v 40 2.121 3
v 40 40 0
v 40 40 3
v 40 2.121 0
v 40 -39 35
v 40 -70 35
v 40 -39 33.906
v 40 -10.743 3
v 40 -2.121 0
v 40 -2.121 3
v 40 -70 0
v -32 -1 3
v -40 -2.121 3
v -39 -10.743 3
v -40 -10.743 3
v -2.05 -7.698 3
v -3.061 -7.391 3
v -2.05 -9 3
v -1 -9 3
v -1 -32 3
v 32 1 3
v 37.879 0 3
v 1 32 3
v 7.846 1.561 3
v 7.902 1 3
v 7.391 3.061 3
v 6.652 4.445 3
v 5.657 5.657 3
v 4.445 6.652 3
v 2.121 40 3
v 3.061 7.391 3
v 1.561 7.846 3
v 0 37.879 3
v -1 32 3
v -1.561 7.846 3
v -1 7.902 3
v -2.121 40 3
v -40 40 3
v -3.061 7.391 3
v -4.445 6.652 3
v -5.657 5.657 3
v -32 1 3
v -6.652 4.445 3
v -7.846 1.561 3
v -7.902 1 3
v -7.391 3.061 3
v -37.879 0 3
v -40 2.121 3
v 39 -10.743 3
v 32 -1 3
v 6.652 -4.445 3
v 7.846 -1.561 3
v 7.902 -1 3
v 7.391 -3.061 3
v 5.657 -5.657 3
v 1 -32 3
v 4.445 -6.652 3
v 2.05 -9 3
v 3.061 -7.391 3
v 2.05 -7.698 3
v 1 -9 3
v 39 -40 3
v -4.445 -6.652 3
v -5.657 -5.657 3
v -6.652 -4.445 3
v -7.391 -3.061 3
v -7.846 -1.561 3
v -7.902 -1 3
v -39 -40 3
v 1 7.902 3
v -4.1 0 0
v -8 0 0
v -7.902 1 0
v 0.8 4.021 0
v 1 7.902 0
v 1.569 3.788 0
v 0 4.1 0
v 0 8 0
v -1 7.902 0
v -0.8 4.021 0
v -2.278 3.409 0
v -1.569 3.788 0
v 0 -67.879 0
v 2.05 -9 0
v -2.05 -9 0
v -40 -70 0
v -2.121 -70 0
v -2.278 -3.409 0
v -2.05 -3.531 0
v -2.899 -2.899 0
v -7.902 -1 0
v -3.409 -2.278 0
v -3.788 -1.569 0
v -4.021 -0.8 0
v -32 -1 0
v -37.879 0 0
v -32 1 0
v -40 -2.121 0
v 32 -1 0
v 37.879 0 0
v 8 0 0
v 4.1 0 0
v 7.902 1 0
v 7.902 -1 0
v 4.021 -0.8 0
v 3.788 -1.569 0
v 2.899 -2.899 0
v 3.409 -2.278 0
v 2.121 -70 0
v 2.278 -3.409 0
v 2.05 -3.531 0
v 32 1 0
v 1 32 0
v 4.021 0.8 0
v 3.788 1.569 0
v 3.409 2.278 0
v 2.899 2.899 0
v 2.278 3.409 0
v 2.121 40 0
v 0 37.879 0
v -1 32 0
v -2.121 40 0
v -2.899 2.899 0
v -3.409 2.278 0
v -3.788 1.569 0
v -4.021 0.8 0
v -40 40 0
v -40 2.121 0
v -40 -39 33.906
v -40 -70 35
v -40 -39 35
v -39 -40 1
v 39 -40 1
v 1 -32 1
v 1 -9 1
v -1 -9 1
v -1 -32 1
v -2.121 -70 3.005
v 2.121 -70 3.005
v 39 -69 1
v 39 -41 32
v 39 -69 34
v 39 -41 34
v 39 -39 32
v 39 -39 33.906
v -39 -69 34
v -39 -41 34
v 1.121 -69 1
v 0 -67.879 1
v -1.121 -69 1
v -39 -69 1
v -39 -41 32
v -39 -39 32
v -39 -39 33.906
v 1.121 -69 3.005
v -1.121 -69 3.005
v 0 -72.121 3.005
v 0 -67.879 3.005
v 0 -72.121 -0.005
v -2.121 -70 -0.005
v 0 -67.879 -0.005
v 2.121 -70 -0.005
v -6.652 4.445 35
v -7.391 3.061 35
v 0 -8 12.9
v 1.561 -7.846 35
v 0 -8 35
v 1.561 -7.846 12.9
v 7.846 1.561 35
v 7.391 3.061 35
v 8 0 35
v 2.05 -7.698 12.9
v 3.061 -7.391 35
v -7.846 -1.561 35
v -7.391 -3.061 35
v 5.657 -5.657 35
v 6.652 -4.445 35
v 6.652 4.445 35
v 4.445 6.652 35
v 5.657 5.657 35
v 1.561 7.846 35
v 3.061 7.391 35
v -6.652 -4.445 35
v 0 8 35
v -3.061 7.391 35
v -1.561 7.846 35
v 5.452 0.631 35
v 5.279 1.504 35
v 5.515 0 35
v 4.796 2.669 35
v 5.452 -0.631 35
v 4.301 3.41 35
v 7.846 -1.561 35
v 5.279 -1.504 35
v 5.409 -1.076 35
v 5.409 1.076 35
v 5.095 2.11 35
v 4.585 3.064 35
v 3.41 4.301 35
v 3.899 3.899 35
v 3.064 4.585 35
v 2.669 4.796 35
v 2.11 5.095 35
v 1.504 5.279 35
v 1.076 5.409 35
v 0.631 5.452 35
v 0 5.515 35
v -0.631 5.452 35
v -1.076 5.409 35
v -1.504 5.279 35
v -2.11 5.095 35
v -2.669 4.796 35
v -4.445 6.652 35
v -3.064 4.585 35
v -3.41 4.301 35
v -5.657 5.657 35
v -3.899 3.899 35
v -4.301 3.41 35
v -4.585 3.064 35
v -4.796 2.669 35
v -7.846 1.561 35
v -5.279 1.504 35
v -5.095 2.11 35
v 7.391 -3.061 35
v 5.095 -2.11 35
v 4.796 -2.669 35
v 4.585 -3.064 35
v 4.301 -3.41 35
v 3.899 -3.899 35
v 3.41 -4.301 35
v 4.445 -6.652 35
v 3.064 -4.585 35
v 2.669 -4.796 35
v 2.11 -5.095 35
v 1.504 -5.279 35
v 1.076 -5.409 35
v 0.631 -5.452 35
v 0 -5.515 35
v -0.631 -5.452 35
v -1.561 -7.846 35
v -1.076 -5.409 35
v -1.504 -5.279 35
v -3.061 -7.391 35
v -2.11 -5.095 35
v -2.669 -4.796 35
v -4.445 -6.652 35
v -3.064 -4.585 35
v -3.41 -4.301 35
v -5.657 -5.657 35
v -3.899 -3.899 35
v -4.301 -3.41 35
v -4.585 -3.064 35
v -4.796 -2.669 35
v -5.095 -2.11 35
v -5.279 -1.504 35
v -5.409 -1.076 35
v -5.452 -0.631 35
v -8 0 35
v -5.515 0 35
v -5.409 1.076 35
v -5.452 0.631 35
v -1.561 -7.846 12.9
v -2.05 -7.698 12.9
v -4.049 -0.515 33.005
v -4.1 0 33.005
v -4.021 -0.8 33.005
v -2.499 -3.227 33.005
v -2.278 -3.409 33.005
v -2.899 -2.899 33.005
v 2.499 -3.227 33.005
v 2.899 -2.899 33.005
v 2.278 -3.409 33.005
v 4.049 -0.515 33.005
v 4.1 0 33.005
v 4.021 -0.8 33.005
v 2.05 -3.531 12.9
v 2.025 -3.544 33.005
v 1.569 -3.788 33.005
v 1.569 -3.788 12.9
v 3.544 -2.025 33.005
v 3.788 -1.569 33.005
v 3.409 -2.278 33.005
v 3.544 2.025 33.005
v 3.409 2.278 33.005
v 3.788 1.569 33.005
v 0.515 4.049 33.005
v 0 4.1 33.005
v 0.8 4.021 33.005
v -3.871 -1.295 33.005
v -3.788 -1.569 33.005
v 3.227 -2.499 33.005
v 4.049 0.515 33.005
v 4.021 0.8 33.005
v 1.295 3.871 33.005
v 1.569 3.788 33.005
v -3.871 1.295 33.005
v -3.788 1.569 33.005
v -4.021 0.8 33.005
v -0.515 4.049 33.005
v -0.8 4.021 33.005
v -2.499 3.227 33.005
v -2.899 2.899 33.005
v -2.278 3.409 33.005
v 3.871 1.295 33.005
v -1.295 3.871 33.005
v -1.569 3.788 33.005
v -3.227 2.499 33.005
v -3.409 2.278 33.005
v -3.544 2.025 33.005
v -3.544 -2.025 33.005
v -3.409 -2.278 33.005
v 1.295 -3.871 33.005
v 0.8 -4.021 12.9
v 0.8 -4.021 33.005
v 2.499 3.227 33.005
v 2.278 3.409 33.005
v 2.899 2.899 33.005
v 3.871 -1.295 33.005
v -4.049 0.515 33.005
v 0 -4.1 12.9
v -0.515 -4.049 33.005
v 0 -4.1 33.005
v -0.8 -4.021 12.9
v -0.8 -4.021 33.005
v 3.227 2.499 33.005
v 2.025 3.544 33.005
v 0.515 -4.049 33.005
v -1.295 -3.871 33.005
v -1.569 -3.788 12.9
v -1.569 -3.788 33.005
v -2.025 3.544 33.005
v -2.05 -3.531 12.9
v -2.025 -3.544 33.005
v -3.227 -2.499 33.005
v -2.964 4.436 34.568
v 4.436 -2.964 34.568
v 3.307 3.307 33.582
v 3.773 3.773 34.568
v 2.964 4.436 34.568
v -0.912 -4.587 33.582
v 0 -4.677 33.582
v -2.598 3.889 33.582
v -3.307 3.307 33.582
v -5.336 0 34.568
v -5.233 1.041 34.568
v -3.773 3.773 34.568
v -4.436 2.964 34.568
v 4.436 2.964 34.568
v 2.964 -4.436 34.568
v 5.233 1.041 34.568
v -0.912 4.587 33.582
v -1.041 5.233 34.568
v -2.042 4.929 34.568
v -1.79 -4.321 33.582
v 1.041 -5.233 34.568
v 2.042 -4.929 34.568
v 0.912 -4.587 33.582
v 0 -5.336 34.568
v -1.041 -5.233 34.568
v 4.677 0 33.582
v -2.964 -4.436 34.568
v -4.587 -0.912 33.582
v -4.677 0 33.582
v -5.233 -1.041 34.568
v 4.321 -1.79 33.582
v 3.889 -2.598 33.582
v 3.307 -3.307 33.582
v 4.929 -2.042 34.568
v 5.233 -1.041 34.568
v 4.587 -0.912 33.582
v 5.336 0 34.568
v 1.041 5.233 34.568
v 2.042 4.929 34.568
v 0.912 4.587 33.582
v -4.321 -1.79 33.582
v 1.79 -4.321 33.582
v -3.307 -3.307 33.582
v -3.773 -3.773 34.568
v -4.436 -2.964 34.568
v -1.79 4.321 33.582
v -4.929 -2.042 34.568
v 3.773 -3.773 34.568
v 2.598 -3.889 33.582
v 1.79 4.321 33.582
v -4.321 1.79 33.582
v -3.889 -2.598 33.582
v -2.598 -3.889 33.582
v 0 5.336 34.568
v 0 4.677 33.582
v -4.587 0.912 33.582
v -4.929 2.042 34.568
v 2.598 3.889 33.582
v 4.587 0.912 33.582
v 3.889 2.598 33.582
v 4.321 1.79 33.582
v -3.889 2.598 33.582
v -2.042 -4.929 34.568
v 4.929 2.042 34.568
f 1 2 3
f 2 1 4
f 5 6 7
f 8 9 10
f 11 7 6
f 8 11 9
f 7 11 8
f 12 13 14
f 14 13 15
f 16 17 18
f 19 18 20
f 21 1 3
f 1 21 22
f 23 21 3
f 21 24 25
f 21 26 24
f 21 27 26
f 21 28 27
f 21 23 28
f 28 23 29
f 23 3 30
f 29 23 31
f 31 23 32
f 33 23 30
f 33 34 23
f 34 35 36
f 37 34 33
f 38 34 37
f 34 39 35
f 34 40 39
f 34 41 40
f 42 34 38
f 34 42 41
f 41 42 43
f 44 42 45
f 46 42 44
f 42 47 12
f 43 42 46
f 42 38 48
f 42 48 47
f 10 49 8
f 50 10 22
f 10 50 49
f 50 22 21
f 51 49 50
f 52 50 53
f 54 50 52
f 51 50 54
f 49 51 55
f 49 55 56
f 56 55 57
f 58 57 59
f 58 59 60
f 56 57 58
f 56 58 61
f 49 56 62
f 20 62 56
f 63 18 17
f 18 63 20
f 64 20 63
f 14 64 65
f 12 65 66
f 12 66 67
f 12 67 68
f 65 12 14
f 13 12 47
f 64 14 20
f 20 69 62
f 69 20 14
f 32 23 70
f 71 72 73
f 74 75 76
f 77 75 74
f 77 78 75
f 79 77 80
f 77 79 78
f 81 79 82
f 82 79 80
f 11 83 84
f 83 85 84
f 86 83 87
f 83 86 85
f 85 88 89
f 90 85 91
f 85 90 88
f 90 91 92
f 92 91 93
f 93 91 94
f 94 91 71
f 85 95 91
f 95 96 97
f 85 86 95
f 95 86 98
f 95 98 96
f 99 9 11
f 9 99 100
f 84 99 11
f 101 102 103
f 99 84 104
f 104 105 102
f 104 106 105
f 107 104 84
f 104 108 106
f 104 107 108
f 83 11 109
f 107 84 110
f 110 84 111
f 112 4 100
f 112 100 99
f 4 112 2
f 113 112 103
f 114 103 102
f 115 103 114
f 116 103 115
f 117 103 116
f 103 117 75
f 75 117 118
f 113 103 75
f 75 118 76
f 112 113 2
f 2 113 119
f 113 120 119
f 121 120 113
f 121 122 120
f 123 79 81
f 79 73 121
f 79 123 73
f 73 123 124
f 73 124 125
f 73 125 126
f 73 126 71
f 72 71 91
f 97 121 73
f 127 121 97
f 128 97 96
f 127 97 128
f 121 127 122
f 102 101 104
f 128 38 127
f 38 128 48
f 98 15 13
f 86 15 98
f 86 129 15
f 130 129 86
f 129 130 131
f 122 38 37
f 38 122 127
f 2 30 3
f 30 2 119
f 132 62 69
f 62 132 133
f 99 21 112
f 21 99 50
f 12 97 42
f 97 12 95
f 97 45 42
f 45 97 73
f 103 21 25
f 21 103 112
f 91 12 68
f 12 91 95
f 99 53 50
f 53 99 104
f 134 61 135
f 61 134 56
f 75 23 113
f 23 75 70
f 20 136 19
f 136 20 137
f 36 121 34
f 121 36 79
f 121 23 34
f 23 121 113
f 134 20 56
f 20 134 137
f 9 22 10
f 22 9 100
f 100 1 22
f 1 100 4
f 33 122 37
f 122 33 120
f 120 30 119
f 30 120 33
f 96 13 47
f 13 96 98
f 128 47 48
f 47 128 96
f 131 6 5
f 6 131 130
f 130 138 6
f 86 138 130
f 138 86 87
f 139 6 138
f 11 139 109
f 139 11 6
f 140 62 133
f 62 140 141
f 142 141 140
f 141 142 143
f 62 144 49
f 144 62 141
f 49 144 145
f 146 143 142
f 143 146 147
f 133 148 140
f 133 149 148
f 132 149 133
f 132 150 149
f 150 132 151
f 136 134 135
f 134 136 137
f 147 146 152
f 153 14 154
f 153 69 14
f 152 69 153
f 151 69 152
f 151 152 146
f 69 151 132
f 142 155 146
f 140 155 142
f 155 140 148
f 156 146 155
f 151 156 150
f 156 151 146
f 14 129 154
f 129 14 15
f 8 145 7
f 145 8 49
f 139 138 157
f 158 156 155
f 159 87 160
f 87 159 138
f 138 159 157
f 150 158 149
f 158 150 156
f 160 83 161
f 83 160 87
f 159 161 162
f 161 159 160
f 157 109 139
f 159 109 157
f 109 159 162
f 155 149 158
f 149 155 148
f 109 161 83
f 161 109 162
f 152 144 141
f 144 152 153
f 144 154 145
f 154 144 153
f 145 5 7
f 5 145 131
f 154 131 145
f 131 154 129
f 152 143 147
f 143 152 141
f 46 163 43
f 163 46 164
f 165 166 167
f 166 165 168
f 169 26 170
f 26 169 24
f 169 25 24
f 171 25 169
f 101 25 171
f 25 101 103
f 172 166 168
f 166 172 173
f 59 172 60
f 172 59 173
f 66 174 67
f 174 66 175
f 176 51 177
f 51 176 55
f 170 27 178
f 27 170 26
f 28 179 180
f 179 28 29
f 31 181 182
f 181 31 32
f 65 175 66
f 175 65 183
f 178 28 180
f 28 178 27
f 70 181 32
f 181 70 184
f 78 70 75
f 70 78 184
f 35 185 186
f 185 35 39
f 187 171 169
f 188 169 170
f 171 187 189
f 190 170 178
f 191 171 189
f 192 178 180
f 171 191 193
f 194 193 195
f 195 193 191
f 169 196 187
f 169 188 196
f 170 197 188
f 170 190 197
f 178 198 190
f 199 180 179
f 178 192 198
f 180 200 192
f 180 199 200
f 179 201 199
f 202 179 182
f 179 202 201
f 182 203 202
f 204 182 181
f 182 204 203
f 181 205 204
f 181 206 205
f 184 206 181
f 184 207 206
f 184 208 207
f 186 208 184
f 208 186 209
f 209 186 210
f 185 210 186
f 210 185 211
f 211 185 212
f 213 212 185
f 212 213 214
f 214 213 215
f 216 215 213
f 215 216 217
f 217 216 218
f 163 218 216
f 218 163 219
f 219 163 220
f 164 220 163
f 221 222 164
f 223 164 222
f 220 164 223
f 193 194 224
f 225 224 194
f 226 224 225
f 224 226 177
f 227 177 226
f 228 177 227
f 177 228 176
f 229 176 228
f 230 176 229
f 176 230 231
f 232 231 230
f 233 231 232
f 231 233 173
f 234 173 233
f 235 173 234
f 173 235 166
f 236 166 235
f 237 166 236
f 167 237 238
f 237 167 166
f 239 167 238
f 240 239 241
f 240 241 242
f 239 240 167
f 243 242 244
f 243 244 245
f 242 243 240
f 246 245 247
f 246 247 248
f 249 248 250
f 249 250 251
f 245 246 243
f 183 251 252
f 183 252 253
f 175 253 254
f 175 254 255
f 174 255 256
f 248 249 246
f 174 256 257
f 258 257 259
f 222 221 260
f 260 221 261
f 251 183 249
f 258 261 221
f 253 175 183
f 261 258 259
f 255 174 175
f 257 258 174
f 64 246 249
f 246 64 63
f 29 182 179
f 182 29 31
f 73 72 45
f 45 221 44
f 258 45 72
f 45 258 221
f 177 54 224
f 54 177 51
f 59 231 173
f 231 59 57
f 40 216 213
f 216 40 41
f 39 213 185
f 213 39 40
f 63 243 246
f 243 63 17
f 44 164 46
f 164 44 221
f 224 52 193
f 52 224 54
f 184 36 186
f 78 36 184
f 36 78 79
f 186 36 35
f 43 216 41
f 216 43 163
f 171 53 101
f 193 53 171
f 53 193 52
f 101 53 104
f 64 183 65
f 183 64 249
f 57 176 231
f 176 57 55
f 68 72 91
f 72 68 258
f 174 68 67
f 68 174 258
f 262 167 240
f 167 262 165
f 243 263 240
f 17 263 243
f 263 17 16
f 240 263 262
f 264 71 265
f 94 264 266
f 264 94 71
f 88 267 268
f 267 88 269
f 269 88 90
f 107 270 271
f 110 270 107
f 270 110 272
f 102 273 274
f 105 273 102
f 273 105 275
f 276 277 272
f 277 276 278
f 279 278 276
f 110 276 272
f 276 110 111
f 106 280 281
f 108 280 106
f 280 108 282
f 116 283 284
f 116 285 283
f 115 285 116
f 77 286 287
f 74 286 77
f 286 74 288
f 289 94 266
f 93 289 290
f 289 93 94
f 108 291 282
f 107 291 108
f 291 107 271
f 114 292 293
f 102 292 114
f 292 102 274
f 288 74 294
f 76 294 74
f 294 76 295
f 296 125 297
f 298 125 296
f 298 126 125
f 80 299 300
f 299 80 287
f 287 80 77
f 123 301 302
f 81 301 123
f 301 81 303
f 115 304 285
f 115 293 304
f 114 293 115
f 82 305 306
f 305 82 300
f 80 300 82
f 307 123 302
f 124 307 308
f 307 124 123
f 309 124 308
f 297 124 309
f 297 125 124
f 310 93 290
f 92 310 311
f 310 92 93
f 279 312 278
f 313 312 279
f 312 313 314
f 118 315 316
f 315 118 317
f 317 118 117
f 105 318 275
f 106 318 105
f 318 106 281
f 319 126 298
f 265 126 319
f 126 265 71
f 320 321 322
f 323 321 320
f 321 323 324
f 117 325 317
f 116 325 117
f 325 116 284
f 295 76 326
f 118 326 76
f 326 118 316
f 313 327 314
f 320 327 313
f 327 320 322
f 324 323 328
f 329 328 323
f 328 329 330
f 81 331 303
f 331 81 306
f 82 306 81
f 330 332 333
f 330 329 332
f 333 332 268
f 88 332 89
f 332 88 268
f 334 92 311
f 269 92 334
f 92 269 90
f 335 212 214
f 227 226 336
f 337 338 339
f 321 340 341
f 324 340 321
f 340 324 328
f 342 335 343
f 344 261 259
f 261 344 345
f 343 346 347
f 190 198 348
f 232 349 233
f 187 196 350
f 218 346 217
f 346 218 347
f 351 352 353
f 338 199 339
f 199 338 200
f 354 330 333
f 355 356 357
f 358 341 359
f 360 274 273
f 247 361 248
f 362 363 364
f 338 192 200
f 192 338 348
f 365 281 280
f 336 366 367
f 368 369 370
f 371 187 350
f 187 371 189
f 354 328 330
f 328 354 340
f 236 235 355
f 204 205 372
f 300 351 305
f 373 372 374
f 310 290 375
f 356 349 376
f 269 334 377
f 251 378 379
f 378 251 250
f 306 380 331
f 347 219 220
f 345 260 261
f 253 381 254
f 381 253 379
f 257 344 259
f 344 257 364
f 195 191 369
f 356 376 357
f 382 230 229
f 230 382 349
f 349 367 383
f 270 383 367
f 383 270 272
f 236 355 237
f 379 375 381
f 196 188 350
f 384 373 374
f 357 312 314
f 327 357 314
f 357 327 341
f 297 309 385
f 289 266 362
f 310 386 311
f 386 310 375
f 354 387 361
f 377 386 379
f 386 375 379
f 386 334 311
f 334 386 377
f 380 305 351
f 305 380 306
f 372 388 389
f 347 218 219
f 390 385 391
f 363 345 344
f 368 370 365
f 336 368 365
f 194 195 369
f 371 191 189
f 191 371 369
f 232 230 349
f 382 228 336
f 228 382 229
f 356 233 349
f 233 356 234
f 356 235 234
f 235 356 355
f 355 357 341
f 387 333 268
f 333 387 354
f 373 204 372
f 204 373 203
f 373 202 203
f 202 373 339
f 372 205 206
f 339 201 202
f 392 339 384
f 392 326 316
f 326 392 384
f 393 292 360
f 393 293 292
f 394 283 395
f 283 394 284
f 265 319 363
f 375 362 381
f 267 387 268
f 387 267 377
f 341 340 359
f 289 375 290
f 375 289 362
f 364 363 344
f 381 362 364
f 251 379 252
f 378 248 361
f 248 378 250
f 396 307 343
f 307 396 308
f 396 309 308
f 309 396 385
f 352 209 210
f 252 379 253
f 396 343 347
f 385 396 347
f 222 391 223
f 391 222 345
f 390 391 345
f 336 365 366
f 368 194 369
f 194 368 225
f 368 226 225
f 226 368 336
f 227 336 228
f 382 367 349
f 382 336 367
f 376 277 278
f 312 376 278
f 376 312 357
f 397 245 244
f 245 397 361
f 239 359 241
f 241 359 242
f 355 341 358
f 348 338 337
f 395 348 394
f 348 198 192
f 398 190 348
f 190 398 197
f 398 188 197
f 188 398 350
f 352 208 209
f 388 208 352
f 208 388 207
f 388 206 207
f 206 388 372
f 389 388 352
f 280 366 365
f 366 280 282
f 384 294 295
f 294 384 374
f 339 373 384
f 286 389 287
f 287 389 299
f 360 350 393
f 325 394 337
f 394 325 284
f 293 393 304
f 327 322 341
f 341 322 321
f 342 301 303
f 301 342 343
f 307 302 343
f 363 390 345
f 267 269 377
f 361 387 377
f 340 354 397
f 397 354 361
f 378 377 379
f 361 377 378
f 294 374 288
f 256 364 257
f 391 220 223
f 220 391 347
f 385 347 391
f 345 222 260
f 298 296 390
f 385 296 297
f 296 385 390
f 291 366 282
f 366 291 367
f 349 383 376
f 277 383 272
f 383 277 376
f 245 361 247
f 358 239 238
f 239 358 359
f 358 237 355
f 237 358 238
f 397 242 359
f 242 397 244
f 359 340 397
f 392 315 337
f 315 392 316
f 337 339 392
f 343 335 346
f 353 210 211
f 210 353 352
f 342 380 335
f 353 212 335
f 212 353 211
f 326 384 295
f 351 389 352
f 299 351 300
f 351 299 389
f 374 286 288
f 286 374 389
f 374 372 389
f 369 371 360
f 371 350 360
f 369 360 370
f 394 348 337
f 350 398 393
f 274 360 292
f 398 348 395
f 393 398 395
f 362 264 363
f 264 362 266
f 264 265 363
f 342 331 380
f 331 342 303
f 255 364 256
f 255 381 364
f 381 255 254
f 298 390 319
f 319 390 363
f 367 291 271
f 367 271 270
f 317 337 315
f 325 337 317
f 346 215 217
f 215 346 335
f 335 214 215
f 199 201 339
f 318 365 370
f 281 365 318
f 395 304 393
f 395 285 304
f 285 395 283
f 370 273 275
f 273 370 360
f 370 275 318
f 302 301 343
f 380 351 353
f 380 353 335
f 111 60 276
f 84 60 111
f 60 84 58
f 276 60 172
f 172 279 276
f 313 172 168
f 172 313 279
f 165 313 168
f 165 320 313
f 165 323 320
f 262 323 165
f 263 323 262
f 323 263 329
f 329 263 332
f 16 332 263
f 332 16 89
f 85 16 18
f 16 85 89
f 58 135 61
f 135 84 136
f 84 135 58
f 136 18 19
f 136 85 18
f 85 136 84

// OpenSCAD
// Drillguide and sawduct collector for drilling on wall
// By Leo Liang, 2018-7-28
//
// Remix on https://www.thingiverse.com/thing:3013962, by Coat, 08-jul-2018
// Licensed under the Creative Commons - Attribution license.

//Primary parameters
//diameter drill (mm), add a little tolerance
drill_diameter = 8.2;
//height of the  guidetube (mm)
guide_height = 35;
//width of the guidetube (mm)
guide_diameter = 16;
//thickness of the baseplate (mm)
plate_thick = 3;
//width of the baseplate (mm)
plate_width = 80;
// width of the sawdust collector (mm)
collector_width = 80; 
//depth of the sawdust collector (mm)
collector_depth = 30; 
//height of the sawdust collector (mm)
collector_height = 35; 
// thickness of the wall of the collector (mm)
collector_thick = 1;

module plate(w,t)
{
  translate([0,0,0.5 * plate_thick]) difference()
  {
    cube([w, w, t], center=true);
    cube([w/1.25, guidlinew, guide_height],center = true);
    cube([guidlinew, w/1.25, guide_height],center = true);
    
    translate([0.5*plate_width,0,-plate_thick/2])
      nodge();
    translate([0,0.5*plate_width,-plate_thick/2])
      nodge();
    translate([-0.5*plate_width,0,-plate_thick/2])
      nodge();
  }
} 

module nodge()
{
  translate([0,0,plate_thick/2]) rotate([0,0,45])
    cube([3,3,plate_thick+0.01], center=true);
}

module collector() {
  offset = min(collector_height, (plate_width-guide_diameter)/2);
  depth = collector_depth + offset;
  difference() {
    translate([0, offset/2, collector_height/2]) cube([collector_width, depth, collector_height], center=true);
    translate([0, offset/2+collector_thick, collector_height/2])
      cube([collector_width-collector_thick*2, depth, collector_height-collector_thick*2], center=true);
  	multmatrix(m=[[1, 0, 0, -collector_width/2-1],
  								[0, 1, -offset/collector_height, collector_depth/2+offset],
	  							[0, 0, 1, 0],
		  						[0, 0, 0, 1]])

      cube([collector_width+2, offset+1, collector_height+1]);
  }
  translate([0,offset/2-depth/2, 0]) nodge();
  // add a bean to strengthen thin wall
  translate([0, collector_depth/2, collector_height-1.5]) cube([collector_width, 2, 3], center=true);
}

//****************************************
//Main
//secondary parameters
$fn = 32;
guidlinew = min(2,drill_diameter/2);
dtop = (guide_diameter + drill_diameter)/2;
channel_height = min(guide_height/2, 10+plate_thick);

//The thing
difference()
{
  union()
  {
    color("red") cylinder(d = guide_diameter, h = guide_height);
    plate(plate_width,plate_thick);
    translate([0, -collector_depth/2-plate_width/2, 0]) collector();
  }  
  
  //drillhole
  cylinder(d = drill_diameter , h = guide_height*3, center = true);

  //edge in top drillguide to make it easier to insert drill
  translate([0,0,guide_height + dtop/5])
    sphere(d= dtop);

  //sawdust-channel
  translate([-drill_diameter/4,-1-guide_diameter/2,-0.1]) 
    cube([drill_diameter/2, guide_diameter/2, channel_height]); 
}
